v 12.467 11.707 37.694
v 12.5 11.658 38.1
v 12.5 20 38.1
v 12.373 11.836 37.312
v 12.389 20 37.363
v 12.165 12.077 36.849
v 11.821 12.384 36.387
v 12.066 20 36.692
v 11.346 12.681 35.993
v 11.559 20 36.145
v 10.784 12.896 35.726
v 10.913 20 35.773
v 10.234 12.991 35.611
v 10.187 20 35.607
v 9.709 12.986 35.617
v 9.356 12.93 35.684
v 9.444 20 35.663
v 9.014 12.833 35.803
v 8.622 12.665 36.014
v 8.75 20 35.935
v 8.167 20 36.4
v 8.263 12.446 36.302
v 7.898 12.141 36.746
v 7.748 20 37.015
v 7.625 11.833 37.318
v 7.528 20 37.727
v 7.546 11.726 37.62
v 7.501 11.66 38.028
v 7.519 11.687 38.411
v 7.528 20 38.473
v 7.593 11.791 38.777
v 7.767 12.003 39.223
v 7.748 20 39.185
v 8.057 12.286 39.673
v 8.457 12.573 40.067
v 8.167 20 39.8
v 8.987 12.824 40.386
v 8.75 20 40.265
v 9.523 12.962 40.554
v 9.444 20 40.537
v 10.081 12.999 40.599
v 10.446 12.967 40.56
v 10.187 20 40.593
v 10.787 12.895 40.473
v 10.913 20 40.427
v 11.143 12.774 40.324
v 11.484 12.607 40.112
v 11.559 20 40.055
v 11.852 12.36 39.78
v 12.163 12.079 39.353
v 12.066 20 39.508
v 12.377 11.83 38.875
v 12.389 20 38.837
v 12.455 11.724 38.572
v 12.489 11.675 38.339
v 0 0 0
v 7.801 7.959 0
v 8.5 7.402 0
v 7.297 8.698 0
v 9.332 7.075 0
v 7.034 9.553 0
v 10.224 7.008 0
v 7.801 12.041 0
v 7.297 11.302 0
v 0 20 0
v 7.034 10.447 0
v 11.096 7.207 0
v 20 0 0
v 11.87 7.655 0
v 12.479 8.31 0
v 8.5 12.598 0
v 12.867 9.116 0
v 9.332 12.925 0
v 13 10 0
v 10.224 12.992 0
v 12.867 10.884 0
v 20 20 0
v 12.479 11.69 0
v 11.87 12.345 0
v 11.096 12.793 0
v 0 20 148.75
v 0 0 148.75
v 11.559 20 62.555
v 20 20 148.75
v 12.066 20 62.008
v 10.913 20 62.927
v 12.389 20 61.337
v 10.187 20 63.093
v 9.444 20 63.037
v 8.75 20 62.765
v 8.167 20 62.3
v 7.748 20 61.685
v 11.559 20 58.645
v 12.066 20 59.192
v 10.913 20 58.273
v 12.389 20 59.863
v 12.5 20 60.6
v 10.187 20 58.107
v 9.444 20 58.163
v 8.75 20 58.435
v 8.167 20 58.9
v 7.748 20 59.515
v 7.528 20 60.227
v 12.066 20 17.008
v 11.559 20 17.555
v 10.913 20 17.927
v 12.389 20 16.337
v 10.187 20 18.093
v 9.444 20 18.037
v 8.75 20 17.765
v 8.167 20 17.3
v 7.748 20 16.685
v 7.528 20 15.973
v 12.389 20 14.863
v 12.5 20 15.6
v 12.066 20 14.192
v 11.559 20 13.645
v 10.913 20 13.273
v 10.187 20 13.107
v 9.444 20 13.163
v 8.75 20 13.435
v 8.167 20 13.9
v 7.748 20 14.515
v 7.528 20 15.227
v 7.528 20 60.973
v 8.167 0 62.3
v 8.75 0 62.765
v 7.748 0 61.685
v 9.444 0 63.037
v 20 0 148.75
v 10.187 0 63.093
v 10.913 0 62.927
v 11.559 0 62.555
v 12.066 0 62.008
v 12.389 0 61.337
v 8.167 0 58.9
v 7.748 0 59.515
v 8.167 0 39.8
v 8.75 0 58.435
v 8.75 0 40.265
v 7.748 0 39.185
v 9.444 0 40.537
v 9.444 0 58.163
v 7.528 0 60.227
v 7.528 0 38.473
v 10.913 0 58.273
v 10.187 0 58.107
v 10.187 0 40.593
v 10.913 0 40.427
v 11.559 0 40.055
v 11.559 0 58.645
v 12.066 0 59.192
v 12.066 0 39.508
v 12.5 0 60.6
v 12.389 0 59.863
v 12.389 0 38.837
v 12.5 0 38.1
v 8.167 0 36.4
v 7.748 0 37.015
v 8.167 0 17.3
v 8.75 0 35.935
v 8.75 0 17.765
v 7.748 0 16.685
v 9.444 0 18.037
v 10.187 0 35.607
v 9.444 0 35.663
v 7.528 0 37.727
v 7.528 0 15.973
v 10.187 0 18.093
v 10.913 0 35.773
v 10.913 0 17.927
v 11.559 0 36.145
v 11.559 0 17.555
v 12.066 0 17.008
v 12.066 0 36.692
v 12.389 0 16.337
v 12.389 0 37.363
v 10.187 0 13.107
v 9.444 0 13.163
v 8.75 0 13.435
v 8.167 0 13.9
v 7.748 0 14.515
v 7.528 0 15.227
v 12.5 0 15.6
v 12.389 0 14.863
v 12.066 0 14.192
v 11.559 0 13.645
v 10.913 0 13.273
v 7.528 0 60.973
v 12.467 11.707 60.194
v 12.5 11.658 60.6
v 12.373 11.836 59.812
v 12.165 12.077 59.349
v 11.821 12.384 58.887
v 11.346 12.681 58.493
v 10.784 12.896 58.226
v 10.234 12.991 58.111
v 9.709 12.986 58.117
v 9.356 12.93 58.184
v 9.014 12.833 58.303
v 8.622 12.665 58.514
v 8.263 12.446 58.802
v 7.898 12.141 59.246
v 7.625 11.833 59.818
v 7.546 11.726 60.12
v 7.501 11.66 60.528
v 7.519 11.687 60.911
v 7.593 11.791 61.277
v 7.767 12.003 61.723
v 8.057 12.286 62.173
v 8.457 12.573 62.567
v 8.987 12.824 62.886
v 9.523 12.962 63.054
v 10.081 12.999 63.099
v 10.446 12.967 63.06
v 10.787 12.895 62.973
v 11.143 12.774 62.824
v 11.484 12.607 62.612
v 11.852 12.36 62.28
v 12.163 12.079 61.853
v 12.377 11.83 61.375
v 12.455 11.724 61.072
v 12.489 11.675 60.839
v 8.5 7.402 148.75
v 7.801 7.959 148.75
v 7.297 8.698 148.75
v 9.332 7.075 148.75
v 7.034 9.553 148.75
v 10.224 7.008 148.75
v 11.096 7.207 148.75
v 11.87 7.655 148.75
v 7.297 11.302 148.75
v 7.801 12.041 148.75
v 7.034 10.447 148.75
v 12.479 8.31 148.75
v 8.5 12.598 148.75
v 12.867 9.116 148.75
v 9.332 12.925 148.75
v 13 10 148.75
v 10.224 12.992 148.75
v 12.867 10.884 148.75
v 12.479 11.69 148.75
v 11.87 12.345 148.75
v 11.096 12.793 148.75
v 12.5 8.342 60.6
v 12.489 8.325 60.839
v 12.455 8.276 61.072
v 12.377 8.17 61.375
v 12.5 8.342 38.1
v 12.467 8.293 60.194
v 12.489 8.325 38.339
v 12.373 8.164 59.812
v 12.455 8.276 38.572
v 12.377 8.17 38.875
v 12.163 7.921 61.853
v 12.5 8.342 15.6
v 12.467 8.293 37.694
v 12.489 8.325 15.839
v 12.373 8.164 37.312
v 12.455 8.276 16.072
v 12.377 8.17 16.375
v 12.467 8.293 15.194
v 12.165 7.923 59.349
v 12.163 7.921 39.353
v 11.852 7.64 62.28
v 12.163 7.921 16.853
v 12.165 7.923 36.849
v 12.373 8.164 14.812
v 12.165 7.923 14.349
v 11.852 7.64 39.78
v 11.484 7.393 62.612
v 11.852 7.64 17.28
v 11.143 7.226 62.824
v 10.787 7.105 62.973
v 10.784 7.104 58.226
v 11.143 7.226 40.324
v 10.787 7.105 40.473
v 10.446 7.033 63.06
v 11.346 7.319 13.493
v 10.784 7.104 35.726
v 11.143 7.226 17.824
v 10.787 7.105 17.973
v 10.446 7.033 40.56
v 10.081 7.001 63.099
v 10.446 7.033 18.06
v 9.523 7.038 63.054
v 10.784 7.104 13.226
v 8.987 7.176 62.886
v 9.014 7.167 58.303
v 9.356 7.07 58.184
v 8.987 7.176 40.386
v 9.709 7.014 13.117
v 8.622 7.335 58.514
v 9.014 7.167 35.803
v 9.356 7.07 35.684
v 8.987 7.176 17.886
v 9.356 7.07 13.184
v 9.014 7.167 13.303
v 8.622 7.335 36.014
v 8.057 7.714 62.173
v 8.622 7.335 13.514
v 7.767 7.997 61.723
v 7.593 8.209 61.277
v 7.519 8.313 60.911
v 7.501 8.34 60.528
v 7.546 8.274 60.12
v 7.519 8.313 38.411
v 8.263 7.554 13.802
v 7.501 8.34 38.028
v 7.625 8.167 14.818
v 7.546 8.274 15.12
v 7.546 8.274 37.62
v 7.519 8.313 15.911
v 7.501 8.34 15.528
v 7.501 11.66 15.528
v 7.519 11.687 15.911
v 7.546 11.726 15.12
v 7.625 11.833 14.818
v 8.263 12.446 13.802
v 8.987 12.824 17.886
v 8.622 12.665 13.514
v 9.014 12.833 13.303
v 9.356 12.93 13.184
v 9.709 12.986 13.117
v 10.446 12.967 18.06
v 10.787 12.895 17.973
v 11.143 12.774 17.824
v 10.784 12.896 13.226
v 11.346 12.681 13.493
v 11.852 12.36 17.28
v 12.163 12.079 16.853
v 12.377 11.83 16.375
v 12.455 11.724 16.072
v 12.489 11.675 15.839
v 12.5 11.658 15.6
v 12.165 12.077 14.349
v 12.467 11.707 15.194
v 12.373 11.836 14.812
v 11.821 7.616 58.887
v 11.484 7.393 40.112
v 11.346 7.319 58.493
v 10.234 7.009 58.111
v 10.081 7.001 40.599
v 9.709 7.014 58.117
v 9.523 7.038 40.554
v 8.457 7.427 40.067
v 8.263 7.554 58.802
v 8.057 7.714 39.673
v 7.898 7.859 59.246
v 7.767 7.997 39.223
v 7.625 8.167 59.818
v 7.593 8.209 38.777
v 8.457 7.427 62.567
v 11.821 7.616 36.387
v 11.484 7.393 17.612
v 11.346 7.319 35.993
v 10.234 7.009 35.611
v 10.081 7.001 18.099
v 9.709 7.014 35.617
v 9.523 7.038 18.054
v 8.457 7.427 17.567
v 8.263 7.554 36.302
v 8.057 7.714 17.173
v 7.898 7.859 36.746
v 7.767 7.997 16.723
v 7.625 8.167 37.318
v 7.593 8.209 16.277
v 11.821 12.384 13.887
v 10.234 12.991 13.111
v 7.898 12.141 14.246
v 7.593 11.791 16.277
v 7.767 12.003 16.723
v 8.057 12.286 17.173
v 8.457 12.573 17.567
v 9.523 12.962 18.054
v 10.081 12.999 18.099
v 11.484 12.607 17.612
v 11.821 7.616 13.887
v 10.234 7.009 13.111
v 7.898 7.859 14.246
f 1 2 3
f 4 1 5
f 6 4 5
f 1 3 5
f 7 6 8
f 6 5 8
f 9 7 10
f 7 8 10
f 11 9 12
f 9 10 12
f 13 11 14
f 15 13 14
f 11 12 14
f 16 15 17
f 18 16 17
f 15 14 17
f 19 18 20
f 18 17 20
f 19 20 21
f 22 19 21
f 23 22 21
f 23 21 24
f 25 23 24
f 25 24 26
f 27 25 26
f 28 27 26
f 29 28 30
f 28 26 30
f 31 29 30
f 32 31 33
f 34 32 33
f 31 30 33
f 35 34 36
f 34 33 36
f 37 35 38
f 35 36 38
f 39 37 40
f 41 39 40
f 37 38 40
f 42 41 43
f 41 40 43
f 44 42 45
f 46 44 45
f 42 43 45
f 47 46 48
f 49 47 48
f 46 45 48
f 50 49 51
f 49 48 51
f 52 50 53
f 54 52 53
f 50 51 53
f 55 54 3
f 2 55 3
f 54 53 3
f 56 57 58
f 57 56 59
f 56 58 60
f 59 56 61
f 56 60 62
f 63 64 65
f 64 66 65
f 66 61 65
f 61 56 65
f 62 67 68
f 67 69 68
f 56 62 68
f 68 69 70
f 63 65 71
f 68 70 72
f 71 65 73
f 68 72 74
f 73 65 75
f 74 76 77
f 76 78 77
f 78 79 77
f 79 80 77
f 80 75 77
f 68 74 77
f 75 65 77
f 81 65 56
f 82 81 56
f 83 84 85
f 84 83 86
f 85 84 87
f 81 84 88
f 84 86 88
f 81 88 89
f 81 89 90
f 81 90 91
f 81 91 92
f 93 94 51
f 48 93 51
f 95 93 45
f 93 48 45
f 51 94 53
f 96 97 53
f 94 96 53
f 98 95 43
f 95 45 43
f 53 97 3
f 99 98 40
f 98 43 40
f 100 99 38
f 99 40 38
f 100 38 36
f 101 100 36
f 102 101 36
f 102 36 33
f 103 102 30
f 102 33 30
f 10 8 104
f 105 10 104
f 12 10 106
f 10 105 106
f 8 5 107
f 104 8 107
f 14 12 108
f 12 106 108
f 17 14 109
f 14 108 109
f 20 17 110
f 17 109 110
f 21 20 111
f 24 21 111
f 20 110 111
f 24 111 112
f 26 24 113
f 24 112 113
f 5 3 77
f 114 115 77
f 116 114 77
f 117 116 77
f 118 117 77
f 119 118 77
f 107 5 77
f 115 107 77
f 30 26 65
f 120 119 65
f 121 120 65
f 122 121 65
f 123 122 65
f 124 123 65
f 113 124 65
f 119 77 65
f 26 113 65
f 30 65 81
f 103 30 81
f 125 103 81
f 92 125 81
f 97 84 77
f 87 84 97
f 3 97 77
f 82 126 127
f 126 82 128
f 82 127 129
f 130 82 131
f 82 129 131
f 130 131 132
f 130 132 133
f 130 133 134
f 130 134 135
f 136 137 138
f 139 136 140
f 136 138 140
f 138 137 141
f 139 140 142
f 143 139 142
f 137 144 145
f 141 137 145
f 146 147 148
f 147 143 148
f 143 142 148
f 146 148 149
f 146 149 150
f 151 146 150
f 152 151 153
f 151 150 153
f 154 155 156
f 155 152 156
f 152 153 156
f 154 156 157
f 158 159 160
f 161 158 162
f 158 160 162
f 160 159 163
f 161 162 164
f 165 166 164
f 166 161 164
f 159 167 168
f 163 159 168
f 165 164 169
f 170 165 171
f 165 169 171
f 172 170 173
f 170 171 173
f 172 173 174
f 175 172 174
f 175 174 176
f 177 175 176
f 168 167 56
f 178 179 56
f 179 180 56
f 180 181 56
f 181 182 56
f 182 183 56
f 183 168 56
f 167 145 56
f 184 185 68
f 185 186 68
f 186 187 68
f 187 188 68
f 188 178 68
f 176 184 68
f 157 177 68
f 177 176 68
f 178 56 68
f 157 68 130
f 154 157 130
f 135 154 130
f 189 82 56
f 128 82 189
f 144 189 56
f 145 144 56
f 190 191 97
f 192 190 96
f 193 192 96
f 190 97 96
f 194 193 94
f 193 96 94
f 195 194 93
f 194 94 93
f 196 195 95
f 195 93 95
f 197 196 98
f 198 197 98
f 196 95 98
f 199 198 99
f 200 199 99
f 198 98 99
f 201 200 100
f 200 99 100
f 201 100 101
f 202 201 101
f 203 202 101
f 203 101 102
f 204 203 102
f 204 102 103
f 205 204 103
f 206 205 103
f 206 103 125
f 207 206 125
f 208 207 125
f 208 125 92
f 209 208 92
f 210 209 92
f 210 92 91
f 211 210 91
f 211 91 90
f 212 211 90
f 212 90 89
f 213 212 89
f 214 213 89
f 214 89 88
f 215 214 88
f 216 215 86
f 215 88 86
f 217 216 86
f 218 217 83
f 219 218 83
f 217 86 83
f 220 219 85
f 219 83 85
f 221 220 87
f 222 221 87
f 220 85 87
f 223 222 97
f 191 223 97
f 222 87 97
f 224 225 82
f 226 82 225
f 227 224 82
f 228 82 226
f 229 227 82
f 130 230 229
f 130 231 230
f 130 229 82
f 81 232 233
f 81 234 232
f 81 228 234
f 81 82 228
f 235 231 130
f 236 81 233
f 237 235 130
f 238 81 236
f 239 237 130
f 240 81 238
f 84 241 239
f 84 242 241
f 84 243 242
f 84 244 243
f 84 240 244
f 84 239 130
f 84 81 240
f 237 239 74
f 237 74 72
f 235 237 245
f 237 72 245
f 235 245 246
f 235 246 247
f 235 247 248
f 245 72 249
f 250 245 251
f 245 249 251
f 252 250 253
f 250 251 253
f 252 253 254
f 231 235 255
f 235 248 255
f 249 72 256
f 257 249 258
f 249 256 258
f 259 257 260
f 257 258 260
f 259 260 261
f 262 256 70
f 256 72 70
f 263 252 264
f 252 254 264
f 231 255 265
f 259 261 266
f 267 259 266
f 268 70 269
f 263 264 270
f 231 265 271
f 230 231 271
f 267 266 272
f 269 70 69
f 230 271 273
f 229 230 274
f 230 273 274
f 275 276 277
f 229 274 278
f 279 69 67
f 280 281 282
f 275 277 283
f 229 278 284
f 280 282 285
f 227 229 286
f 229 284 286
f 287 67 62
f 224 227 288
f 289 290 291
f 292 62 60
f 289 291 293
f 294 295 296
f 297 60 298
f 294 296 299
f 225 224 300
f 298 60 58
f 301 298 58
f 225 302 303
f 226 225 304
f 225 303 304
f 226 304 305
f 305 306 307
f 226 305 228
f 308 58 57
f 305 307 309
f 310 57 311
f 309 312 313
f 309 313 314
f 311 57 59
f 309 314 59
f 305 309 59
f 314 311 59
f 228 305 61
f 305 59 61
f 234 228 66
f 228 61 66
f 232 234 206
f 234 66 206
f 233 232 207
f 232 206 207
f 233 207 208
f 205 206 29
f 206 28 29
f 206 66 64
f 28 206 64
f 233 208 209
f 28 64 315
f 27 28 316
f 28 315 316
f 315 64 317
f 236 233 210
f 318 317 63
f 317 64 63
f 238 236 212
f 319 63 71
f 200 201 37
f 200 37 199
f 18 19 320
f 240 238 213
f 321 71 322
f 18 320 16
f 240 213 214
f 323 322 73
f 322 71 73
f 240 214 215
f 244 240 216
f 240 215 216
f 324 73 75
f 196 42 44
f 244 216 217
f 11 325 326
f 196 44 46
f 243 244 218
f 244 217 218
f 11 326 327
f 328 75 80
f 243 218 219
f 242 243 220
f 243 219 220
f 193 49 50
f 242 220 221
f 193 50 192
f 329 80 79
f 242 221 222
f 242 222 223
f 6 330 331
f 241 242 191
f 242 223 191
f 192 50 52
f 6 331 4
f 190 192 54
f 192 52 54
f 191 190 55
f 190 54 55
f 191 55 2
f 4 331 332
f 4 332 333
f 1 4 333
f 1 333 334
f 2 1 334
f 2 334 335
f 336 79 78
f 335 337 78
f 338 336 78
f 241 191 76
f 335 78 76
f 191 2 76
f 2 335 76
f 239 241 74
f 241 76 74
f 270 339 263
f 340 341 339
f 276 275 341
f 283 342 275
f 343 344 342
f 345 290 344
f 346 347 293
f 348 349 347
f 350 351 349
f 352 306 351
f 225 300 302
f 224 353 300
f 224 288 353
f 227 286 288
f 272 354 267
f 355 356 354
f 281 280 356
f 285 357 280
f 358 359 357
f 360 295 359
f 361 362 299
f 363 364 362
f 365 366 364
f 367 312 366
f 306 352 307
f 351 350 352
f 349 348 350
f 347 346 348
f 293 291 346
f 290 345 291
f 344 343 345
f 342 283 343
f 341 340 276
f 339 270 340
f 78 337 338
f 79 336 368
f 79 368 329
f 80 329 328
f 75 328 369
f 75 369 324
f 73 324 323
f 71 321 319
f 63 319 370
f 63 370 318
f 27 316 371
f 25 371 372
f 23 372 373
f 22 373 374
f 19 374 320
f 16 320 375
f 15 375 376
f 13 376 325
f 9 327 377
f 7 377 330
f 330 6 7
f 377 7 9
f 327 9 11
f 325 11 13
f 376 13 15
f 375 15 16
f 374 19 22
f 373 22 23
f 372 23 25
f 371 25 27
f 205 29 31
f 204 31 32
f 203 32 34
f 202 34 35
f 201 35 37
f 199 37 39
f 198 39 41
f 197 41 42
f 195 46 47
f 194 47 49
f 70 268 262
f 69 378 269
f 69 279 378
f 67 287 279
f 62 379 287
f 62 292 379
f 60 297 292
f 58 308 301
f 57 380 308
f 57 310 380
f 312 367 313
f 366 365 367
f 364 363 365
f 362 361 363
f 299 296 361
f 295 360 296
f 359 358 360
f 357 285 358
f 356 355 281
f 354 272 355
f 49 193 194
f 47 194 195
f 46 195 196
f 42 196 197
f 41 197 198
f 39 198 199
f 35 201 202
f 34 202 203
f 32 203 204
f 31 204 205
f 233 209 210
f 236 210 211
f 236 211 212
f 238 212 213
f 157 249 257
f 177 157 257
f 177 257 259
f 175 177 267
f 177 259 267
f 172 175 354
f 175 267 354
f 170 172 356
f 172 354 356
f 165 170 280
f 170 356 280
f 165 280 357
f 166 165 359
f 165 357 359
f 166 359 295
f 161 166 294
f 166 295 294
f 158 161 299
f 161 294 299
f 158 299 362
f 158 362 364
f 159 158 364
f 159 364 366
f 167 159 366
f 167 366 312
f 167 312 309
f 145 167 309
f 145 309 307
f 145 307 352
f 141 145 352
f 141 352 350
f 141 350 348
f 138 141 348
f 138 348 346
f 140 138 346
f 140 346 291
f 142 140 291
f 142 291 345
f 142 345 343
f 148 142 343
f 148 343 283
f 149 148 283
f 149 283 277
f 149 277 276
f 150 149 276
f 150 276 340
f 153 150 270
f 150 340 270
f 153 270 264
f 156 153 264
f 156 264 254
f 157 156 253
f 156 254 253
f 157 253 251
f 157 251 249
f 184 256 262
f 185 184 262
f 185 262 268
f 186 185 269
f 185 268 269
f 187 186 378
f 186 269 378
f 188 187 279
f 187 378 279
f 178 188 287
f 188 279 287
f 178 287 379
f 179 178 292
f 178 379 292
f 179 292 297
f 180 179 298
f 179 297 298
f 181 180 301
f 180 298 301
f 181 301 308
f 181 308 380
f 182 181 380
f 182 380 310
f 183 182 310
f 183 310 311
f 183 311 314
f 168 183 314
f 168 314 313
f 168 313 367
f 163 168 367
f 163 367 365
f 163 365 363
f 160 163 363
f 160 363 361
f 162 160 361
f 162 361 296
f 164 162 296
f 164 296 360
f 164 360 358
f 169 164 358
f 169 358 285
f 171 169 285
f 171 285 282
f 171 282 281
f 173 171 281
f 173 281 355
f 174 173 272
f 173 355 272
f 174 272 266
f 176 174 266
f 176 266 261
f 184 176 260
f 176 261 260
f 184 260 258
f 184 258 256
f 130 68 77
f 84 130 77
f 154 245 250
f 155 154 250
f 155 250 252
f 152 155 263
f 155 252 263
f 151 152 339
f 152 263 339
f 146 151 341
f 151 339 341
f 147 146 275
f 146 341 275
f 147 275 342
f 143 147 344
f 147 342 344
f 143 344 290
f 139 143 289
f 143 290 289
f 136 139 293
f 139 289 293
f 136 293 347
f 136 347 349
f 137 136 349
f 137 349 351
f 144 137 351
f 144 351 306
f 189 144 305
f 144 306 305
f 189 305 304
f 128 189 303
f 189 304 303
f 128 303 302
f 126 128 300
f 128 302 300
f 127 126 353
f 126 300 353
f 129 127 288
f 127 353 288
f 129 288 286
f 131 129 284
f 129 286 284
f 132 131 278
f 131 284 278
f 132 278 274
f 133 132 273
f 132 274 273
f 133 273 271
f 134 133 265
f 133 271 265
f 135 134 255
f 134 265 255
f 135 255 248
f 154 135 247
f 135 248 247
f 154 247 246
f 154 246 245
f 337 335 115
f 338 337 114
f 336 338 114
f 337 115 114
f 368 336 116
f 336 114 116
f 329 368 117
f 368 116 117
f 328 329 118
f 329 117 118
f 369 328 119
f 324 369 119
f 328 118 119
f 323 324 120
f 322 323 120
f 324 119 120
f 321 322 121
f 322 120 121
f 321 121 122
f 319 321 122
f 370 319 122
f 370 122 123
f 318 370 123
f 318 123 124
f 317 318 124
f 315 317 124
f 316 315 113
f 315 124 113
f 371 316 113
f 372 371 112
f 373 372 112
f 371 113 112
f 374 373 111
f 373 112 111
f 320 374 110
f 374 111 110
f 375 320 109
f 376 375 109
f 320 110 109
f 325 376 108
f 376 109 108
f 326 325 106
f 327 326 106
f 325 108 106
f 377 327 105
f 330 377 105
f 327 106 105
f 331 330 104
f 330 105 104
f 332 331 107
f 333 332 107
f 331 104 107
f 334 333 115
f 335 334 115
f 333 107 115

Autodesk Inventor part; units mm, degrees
ref_plane "YZ Plane" through (0, 0, 0) normal (1, 0, 0) x (0, 1, 0)
ref_plane "XZ Plane" through (0, 0, 0) normal (0, 1, 0) x (-1, 0, 0)
ref_plane "XY Plane" through (0, 0, 0) normal (0, 0, 1) x (1, 0, 0)
sketch "Sketch1" plane through (0, 0, 0) normal (0, 0, 1) x (1, 0, 0)
  line L0 (0, 0) -> (20, 0)
  line L1 (20, 0) -> (20, 20)
  line L2 (20, 20) -> (0, 20)
  line L3 (0, 20) -> (0, 0)
  circle A0 centre (10, 10) radius 3
  point P0 (10, 20)
  point P1 (20, 10)
  dimension "d0" = 20
  dimension "d1" = 20
  dimension "d2" = 6
extrude "Extrusion1" add sketch "Sketch1" along normal blind 148.75
sketch "Sketch2" plane through (0, 20, 0) normal (0, 1, 0) x (1, 0, 0)
  circle A0 centre (10, -15.6) radius 2.5
  circle A1 centre (10, -38.1) radius 2.5
  circle A2 centre (10, -60.6) radius 2.5
  line L0 (20, 0) -> (0, 0) projected
  point P0 (10, 0)
  dimension "d5" = 5
  dimension "d6" = 5
  dimension "d7" = 5
  dimension "d8" = 15.6
  dimension "d9" = 22.5
  dimension "d10" = 22.5
extrude "Extrusion2" cut sketch "Sketch2" against normal through all
properties part number "AE01" material "Aluminum 6061"
